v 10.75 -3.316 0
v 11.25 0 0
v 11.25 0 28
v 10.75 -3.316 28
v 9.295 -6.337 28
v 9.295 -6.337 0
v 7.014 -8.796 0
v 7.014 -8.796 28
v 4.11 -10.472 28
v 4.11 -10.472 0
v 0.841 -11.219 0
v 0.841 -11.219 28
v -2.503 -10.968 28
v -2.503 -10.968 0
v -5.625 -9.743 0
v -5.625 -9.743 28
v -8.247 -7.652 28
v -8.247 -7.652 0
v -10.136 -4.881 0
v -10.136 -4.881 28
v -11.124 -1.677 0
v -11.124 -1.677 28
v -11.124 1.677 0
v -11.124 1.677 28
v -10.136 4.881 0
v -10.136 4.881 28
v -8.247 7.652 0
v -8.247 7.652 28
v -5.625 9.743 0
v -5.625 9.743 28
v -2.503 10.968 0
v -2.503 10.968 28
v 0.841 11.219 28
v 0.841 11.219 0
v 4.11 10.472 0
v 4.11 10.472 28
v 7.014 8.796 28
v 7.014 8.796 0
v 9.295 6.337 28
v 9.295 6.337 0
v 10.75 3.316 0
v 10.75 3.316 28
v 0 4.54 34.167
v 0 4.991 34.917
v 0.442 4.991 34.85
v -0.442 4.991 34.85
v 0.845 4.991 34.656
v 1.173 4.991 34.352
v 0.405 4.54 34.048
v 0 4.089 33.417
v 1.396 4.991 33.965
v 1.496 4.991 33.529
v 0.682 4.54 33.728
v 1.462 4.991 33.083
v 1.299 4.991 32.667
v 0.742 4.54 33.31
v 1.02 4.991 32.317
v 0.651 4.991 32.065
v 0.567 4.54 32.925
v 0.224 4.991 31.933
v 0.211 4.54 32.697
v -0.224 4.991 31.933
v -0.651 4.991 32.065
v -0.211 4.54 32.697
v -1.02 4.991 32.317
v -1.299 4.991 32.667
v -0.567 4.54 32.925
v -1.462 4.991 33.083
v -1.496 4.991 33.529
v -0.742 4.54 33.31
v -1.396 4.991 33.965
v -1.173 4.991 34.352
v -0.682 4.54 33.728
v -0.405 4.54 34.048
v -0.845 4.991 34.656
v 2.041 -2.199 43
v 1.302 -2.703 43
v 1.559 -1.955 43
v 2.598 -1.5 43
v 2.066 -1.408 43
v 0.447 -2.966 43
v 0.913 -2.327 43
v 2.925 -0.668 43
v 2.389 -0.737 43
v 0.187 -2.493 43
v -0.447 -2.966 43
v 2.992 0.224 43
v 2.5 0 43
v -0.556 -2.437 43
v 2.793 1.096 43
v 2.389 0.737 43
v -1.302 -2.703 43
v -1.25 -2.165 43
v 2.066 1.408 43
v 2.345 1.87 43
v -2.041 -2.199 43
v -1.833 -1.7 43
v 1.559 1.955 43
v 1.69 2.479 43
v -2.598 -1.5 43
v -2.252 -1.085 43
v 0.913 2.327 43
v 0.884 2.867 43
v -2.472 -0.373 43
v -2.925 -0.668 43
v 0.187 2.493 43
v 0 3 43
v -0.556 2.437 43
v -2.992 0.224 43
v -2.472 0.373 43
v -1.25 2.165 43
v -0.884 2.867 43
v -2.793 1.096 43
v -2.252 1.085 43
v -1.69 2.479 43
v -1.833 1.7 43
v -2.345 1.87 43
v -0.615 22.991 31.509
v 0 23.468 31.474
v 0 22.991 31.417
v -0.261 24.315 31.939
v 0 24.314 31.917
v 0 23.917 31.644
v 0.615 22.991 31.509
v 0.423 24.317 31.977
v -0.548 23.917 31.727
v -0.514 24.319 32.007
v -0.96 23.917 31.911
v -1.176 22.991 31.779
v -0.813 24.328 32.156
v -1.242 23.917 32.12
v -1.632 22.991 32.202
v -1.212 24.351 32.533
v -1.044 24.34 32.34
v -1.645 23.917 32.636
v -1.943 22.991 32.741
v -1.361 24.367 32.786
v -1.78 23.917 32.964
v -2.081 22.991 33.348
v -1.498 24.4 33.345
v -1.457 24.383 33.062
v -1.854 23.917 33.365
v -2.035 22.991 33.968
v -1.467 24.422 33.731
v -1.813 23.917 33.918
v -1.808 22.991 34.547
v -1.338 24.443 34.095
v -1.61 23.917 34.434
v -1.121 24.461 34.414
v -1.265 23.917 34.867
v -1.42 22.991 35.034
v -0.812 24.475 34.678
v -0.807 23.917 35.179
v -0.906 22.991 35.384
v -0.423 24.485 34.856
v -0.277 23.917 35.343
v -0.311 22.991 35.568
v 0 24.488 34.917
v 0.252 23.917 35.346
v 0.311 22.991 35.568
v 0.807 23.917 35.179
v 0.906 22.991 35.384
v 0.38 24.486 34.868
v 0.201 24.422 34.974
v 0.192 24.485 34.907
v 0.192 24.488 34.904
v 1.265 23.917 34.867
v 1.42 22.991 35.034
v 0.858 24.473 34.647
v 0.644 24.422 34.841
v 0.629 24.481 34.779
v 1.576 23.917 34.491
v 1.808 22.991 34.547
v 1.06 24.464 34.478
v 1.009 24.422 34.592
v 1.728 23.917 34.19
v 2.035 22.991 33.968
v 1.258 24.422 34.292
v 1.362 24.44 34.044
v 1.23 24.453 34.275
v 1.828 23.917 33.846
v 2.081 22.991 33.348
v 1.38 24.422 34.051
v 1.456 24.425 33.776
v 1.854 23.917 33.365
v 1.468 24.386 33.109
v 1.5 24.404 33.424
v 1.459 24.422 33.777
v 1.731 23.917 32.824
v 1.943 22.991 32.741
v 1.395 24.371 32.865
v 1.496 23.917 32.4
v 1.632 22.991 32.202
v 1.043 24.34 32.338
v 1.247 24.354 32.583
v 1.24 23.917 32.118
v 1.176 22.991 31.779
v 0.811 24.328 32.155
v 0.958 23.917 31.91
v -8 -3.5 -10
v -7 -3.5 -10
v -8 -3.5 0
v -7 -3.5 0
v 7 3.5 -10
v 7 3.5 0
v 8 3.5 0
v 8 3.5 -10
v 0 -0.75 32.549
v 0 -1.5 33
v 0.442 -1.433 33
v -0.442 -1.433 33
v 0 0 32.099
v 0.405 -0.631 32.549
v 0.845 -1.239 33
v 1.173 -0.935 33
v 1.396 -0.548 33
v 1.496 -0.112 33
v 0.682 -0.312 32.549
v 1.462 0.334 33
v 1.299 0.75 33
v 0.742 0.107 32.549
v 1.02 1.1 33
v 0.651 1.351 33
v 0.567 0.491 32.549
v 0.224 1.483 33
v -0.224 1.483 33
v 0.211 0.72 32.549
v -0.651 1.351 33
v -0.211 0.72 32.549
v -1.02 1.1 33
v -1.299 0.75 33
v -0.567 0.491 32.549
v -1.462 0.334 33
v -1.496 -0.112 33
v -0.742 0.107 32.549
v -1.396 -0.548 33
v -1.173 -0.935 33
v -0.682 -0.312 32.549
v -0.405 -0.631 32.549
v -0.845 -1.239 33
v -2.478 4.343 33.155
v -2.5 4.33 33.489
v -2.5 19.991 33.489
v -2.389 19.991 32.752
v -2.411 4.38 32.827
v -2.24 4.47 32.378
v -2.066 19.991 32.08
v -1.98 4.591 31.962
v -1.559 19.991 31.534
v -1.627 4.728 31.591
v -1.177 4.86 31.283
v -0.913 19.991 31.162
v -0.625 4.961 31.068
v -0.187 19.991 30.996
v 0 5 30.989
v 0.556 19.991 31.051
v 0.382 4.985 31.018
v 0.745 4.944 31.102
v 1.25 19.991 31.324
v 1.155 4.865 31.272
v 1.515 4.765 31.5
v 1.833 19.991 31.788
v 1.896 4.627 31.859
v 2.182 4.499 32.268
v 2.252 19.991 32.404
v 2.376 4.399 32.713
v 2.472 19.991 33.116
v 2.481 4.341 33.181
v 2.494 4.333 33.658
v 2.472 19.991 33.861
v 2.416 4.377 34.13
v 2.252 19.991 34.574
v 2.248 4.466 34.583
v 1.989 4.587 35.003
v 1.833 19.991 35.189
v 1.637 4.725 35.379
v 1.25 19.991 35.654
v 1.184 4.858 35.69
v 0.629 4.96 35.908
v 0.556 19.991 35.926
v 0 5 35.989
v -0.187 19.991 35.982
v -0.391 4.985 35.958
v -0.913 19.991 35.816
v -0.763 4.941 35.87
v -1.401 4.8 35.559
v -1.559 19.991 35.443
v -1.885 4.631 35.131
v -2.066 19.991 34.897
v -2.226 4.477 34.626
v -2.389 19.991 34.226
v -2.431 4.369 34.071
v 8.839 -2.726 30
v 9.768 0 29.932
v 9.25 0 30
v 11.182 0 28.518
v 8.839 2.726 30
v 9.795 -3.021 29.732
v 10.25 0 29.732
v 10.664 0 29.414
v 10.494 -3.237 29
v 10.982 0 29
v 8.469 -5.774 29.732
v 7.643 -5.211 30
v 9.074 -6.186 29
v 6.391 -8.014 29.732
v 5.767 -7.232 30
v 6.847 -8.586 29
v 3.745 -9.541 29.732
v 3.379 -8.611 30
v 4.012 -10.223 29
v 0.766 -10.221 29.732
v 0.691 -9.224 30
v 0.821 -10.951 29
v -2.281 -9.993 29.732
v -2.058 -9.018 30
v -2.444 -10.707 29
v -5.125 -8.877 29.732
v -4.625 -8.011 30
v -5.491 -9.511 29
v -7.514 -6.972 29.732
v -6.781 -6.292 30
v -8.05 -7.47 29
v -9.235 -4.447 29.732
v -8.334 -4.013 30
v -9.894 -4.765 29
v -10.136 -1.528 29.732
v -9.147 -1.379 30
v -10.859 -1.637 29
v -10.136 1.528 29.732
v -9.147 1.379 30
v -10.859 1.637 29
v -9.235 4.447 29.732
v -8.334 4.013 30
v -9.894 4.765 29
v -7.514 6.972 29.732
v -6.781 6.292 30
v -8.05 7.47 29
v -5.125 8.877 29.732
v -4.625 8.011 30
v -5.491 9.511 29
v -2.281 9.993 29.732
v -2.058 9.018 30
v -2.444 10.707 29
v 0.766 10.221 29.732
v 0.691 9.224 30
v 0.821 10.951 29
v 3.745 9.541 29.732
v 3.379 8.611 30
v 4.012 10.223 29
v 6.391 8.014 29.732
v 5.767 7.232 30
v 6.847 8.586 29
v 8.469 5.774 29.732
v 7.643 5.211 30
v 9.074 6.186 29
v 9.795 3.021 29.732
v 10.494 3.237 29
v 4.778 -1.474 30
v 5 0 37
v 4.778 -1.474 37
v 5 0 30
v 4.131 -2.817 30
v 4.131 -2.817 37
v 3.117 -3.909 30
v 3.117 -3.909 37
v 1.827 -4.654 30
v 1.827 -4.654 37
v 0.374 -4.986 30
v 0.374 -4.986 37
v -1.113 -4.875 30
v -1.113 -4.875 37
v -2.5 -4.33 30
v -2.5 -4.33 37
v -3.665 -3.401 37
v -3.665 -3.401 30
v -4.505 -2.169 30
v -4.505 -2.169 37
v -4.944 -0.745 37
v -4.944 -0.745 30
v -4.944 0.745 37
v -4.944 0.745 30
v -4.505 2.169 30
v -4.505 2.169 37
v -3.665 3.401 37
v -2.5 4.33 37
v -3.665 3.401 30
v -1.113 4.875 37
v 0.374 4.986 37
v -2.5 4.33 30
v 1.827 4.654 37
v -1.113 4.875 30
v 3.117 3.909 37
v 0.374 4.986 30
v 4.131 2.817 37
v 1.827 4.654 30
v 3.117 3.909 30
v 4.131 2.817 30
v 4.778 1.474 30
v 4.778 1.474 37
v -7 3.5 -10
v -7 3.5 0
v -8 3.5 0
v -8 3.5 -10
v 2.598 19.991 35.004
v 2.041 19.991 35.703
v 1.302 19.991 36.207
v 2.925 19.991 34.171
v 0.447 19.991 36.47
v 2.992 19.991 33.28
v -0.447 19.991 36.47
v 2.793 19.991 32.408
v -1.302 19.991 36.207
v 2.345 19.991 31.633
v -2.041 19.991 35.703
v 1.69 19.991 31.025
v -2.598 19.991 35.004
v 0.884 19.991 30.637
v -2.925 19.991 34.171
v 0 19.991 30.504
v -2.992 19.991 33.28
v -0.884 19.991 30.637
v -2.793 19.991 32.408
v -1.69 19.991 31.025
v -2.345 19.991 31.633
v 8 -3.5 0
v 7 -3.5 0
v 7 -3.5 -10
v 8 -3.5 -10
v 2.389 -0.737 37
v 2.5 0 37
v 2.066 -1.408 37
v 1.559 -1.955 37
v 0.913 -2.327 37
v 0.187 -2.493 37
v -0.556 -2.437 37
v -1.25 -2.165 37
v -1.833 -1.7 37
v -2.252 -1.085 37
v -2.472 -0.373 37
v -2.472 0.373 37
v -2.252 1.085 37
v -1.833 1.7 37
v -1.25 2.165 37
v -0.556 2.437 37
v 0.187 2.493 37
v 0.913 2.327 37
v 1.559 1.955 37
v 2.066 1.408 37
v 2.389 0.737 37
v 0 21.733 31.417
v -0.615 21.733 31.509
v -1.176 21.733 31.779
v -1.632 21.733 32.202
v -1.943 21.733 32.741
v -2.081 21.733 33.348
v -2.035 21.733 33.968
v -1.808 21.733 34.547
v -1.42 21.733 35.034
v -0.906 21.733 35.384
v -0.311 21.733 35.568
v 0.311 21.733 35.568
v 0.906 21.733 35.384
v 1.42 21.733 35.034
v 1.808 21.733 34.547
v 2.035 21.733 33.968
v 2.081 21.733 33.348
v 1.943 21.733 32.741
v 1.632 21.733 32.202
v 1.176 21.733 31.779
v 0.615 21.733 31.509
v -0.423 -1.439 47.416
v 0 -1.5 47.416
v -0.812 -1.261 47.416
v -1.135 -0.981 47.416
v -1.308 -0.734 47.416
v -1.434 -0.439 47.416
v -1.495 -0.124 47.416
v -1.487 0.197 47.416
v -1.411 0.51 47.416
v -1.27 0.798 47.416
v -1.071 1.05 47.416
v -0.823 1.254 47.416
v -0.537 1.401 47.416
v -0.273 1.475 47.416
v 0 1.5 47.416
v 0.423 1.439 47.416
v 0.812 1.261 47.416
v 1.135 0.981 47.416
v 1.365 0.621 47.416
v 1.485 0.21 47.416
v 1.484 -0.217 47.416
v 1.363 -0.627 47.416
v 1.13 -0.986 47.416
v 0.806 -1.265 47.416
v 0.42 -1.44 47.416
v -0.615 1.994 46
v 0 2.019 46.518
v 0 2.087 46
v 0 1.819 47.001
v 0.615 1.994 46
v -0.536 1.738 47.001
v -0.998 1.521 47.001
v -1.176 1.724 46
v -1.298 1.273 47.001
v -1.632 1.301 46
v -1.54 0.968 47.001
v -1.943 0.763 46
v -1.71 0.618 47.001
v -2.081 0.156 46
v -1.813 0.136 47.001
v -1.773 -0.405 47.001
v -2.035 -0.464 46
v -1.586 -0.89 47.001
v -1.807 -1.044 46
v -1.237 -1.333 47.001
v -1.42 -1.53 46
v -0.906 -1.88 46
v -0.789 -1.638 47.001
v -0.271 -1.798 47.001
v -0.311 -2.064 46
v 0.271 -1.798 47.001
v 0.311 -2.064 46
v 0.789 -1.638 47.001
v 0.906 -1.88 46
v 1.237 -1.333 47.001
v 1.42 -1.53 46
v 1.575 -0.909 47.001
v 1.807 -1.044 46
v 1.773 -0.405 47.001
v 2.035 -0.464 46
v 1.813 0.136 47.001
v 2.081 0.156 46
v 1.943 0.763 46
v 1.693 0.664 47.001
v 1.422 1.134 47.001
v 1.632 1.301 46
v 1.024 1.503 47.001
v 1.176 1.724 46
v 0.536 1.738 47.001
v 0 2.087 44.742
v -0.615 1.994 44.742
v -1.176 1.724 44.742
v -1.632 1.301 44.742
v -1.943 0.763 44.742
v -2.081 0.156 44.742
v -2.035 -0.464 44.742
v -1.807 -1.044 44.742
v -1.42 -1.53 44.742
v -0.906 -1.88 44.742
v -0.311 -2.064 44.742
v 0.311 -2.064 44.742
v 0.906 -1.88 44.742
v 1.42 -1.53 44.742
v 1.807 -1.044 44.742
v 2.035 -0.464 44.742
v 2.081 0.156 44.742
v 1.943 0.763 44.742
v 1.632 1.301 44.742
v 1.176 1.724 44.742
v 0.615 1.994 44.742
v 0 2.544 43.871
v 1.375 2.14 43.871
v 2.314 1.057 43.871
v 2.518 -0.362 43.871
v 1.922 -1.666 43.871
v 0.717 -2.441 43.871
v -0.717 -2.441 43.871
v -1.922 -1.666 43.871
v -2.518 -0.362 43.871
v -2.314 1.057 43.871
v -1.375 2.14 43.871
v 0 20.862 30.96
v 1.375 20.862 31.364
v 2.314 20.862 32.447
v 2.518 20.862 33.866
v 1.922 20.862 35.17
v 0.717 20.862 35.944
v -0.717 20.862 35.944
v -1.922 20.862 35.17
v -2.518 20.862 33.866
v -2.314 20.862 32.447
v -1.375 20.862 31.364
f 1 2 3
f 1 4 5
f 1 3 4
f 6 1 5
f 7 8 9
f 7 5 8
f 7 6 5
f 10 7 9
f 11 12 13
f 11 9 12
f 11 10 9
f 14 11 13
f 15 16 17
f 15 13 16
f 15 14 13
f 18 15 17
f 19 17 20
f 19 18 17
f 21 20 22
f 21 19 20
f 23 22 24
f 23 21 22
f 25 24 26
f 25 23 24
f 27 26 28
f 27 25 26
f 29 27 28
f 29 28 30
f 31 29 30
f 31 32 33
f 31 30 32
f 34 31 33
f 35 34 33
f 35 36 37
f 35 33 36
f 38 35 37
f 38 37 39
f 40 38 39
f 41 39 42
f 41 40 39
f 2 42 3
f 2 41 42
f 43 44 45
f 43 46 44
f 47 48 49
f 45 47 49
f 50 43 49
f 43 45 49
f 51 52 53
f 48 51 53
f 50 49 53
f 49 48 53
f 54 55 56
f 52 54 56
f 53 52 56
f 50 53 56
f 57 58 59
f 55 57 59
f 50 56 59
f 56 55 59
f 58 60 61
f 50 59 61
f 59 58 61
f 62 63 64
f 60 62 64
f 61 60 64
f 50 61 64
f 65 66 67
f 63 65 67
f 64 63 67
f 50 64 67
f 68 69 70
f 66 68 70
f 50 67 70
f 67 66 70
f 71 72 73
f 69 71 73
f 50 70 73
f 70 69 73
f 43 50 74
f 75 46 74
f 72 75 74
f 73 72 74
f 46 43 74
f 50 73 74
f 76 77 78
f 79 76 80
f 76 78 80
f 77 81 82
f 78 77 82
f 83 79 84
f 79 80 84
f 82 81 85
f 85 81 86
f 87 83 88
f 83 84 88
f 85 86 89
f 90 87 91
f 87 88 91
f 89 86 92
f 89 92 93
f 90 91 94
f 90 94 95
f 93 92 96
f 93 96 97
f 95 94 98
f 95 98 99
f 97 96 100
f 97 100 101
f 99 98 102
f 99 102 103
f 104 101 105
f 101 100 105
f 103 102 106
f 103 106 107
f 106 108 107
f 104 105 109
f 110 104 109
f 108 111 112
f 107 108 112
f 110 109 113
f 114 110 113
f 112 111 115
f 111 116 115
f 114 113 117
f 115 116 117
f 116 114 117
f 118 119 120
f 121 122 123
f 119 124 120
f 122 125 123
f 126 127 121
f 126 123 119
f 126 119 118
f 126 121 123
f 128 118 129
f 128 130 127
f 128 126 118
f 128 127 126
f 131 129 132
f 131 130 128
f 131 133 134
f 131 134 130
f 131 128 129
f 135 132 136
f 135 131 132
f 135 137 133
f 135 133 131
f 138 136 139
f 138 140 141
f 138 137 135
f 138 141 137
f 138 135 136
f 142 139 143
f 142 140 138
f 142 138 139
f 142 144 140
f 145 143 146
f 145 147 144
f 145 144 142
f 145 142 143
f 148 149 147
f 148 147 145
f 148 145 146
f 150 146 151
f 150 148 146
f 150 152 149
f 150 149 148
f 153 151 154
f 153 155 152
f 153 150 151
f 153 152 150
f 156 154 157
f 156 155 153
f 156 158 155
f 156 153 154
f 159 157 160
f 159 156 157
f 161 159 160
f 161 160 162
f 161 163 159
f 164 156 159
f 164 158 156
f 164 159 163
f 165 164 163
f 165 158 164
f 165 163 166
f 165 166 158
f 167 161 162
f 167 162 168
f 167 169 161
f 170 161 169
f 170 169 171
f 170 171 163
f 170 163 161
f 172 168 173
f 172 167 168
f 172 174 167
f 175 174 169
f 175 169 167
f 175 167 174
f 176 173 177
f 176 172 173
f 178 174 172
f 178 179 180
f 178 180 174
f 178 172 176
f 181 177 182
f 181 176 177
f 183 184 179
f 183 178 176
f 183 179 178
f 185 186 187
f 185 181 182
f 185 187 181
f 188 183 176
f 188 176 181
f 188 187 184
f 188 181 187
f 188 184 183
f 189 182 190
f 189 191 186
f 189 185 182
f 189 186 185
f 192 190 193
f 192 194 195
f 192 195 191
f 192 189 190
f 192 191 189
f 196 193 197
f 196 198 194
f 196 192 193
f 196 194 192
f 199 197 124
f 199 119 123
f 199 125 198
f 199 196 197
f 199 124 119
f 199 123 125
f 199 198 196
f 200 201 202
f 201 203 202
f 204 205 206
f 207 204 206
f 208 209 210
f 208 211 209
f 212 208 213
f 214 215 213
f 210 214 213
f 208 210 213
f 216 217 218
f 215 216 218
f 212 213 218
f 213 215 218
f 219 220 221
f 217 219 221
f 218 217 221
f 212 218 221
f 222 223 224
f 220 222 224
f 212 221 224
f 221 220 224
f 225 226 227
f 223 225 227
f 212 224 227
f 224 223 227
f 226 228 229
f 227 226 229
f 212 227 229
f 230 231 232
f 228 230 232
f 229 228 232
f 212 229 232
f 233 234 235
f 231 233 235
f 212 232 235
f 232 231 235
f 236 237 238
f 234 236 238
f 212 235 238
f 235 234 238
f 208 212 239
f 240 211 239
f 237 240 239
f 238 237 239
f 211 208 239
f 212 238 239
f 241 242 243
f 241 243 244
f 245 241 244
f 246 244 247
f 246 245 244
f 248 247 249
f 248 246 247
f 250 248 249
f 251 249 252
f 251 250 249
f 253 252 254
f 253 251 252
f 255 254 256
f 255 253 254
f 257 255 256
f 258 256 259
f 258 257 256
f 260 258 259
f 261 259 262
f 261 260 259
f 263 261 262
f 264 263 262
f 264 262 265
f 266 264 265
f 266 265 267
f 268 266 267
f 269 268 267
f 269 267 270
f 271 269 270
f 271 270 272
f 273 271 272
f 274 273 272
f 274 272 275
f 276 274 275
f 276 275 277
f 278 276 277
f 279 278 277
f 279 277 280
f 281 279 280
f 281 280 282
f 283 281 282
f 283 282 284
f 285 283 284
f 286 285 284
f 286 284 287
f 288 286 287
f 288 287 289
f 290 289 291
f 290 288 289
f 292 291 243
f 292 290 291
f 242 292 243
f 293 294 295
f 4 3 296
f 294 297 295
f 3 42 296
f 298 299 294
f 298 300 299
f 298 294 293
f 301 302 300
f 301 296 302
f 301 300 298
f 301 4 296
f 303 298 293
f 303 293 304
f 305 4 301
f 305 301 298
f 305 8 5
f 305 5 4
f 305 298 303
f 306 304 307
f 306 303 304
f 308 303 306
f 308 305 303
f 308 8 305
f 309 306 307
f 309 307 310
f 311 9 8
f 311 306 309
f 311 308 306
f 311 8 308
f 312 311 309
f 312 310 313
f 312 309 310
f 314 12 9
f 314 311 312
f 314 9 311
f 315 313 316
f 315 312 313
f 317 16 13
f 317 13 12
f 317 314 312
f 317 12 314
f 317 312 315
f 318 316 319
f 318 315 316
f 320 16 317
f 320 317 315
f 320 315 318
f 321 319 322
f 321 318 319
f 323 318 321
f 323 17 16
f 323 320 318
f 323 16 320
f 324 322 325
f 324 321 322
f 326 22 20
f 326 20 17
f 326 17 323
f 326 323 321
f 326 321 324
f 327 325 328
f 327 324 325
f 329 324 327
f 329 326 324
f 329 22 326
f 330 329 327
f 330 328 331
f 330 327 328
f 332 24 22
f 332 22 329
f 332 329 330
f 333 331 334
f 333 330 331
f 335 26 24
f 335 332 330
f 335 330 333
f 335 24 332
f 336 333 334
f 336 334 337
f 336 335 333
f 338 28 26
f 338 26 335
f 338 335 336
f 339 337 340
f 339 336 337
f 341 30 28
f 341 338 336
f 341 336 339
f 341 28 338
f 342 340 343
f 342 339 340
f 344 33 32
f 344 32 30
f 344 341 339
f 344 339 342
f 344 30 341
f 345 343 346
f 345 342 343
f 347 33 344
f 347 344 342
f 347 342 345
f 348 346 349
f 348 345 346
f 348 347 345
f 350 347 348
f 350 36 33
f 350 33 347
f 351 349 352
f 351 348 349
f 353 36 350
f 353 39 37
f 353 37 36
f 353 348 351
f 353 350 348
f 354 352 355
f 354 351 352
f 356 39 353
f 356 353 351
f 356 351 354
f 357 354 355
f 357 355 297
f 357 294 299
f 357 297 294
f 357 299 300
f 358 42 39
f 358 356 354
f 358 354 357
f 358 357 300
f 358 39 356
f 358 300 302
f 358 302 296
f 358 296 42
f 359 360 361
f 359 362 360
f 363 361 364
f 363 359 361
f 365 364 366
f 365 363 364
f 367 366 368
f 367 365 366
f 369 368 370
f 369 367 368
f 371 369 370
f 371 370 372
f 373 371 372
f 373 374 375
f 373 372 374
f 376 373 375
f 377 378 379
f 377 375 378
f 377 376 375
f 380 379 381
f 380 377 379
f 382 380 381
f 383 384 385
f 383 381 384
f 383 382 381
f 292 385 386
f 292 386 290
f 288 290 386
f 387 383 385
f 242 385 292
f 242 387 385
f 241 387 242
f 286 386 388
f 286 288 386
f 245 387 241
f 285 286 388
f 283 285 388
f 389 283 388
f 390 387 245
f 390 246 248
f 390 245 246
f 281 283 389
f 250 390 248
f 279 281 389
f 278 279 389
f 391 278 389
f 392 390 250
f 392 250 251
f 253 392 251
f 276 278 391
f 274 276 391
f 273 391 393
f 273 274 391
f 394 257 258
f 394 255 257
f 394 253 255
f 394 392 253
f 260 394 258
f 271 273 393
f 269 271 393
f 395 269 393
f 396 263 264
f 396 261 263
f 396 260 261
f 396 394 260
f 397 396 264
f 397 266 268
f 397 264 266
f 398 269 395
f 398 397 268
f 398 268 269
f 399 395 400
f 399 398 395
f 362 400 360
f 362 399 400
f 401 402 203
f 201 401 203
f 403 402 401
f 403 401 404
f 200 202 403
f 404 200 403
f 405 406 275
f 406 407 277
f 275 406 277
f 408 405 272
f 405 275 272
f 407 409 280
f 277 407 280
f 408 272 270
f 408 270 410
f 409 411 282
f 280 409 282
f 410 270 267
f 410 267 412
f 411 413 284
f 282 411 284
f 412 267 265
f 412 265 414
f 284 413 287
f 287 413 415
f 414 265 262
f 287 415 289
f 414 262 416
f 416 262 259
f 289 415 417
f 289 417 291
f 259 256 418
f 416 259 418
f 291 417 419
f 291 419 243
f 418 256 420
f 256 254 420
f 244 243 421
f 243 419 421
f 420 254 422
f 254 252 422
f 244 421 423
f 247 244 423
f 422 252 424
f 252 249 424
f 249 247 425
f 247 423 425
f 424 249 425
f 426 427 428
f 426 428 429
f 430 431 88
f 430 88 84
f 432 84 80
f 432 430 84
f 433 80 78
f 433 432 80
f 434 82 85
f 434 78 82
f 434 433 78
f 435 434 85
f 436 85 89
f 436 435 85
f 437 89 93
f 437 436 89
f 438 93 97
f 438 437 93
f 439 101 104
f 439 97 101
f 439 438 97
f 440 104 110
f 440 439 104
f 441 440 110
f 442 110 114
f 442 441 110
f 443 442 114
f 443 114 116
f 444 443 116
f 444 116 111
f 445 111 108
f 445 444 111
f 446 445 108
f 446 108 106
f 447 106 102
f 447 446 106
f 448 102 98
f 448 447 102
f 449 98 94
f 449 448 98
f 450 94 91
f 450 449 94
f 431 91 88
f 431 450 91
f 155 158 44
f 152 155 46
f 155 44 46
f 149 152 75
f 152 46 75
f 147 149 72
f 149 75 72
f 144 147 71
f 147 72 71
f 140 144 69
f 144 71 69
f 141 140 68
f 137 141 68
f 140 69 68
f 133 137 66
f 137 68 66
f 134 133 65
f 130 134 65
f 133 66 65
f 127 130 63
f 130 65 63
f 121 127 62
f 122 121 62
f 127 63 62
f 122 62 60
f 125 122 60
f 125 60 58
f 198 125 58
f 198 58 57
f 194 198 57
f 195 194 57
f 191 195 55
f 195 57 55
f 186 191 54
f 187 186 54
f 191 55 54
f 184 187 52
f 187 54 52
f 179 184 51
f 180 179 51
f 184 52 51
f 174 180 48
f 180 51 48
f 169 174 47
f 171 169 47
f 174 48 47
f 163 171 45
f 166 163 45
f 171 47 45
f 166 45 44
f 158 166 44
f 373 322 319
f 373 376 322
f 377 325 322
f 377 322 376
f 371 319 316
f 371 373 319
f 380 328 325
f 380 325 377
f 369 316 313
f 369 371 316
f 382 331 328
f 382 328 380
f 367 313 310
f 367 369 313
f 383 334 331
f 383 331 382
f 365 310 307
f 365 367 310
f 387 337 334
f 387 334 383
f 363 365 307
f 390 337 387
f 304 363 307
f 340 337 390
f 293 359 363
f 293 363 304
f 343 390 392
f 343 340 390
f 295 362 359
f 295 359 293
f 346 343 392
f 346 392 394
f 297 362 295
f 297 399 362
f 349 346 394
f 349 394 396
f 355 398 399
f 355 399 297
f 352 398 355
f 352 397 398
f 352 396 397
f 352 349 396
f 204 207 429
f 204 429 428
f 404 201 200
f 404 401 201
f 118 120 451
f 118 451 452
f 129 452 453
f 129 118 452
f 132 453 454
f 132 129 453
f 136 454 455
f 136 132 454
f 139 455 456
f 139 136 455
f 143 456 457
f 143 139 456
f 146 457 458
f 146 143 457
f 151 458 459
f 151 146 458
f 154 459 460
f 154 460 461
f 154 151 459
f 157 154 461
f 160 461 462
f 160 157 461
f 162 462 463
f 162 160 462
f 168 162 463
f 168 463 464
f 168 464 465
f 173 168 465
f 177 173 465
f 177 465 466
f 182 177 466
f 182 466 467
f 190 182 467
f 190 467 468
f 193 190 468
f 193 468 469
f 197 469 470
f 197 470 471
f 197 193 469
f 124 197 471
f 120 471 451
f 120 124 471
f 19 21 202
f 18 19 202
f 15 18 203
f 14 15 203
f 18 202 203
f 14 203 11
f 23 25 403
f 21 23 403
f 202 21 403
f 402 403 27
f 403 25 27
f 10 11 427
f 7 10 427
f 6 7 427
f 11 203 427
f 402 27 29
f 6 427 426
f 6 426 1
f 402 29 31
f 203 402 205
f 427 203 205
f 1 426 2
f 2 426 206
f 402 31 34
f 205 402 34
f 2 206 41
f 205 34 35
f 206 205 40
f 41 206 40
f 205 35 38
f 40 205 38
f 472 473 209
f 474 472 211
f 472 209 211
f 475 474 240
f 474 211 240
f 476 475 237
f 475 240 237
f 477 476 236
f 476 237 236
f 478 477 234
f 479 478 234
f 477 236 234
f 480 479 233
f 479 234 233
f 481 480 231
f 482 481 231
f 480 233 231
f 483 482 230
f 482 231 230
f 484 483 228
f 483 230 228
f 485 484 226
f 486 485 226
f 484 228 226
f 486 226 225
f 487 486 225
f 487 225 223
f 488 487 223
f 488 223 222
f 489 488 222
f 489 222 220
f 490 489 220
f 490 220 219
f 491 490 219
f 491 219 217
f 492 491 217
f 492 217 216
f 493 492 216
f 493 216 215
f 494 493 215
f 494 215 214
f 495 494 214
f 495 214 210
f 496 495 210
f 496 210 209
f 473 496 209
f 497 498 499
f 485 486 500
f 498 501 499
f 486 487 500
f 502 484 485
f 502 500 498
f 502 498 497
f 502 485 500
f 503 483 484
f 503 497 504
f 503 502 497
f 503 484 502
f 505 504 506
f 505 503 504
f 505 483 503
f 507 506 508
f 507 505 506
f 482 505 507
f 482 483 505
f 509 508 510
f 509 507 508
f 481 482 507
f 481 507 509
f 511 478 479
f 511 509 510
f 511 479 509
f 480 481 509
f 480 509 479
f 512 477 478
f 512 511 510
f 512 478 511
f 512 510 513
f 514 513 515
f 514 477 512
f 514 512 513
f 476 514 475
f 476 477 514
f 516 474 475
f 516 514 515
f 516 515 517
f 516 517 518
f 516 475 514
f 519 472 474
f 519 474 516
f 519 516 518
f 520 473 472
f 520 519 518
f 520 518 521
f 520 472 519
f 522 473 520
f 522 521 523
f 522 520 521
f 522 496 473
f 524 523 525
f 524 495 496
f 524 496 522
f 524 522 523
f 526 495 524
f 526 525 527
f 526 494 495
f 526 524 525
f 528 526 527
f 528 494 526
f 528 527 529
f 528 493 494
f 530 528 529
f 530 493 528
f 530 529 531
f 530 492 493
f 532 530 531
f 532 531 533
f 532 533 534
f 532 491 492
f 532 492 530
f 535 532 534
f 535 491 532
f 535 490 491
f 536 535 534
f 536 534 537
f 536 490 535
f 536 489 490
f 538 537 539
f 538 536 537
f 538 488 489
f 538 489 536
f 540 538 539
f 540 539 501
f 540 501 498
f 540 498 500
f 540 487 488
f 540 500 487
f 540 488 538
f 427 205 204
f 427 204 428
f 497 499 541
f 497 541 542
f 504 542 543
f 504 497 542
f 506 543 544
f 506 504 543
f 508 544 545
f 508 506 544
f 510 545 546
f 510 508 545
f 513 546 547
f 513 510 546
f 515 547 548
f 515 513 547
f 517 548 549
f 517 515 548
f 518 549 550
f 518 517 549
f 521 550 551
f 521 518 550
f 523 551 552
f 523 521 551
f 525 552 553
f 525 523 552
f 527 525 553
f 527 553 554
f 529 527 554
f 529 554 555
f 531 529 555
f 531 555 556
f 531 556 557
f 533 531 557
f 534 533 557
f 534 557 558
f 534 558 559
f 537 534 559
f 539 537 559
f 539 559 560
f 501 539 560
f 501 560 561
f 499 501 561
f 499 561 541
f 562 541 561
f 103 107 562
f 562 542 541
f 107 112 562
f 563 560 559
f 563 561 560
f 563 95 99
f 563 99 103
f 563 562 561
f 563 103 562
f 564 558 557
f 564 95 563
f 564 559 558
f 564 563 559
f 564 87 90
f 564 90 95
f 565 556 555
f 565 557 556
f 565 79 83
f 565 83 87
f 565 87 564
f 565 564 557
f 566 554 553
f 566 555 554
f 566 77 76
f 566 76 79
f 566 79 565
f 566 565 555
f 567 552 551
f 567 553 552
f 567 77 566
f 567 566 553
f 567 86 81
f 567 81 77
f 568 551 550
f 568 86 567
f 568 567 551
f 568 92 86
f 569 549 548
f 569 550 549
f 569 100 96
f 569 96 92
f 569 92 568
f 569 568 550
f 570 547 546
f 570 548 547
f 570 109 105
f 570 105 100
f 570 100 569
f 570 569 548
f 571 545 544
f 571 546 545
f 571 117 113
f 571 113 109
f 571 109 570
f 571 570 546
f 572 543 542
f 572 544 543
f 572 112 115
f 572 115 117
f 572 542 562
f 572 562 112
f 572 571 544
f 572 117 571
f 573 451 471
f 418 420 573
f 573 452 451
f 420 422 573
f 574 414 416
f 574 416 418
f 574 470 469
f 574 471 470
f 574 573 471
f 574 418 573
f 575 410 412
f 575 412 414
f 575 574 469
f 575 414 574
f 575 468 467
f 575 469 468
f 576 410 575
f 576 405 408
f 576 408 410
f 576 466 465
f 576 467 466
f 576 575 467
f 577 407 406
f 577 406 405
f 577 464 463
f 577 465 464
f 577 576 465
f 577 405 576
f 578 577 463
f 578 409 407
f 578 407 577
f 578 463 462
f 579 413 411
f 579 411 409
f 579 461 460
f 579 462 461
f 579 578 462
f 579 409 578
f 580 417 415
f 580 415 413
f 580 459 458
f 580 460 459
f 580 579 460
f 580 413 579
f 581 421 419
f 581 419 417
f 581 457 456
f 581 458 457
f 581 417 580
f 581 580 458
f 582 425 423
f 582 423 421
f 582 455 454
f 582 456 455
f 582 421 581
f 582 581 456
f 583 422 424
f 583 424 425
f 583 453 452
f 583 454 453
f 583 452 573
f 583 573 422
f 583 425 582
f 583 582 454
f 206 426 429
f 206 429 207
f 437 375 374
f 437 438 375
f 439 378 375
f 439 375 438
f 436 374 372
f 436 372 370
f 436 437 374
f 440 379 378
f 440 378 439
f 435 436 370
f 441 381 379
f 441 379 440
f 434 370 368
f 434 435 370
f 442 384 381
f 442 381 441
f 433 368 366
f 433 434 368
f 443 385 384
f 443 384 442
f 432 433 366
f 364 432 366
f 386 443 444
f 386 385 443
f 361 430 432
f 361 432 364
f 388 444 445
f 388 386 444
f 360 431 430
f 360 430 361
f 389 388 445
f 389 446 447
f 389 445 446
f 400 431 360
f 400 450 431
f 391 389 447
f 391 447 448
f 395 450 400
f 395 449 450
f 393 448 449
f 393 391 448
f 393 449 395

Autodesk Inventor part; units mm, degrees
ref_plane "XY Plane" through (0, 0, 0) normal (0, 0, 1) x (1, 0, 0)
sketch "Block1" plane through (0, 0, 0) normal (0, 0, 1) x (1, 0, 0)
  line L0 (-0.685, 86) -> (2.315, 86)
  line L1 (-0.685, 86) -> (-0.685, 91)
  line L2 (2.315, 86) -> (1.4022, 87.742)
  line L3 (1.4022, 87.742) -> (1.4022, 89)
  line L4 (-0.5978, 91) -> (-0.685, 91)
  arc A0 (1.4022, 89) -> (-0.5978, 91) centre (-0.5978, 89) ccw
  point P0 (0.6511, 88.4856)
  dimension "d9" = 3
  dimension "d10" = 5
  dimension "d11" = 2
  dimension "d14" = 152.344
  dimension "d15" = 2.0871
sketch "Skizze1" plane through (0, 0, 0) normal (0, 0, 1) x (1, 0, 0)
  point P0 (0, 0)
sketch "Skizze2" plane through (0, 0, 0) normal (0, 0, 1) x (1, 0, 0)
  circle A0 centre (0, 0) radius 11.25
  dimension "d0" = 22.5
extrude "Extrusion1" add sketch "Skizze2" along normal blind 30
sketch "Skizze3" plane through (0, 0, 30) normal (0, 0, 1) x (1, 0, 0)
  circle A0 centre (0, 0) radius 11.25 projected
  circle A1 centre (0, 0) radius 5
  dimension "d3" = 10
extrude "Extrusion2" add sketch "Skizze3" along normal blind 7 contours A1
sketch "Skizze4" plane through (0, 0, 37) normal (0, 0, 1) x (1, 0, 0)
  circle A0 centre (0, 0) radius 5 projected
  circle A1 centre (0, 0) radius 2.5
  dimension "d6" = 5
extrude "Extrusion3" add sketch "Skizze4" along normal blind 6 contours A1
sketch "Skizze5" plane through (0, 0, 0) normal (1, 0, 0) x (0, 1, 0)
  line L0 (2.5, 43) -> (-2.5, 43) projected
  line L1 (-2.5, 43) -> (2.5, 43) construction
  line L2 (0, 43) -> (3, 43)
  line L3 (0, 43) -> (0, 48)
  line L4 (3, 43) -> (2.0871, 44.742)
  line L5 (2.0871, 44.742) -> (2.0871, 46)
  line L6 (0.0871, 48) -> (0, 48)
  arc A0 (2.0871, 46) -> (0.0871, 48) centre (0.0871, 46) ccw
  point P0 (0, 0)
sketch "Skizze6" plane through (0, 0, 0) normal (0, 0, -1) x (-1, 0, 0)
  line L0 (7, 3.5) -> (7, -3.5)
  line L1 (7, -3.5) -> (8, -3.5)
  line L2 (7, 3.5) -> (8, 3.5)
  line L3 (8, -3.5) -> (8, 3.5)
  line L4 (0, 11.25) -> (0, -11.25) construction
  line L5 (-7, 3.5) -> (-7, -3.5)
  line L6 (-7, -3.5) -> (-8, -3.5)
  line L7 (-7, 3.5) -> (-8, 3.5)
  line L8 (-8, -3.5) -> (-8, 3.5)
  point P0 (0, 0)
  dimension "d19" = 7
  dimension "d20" = 1
  dimension "d21" = 7
  dimension "d23" = 3.5
extrude "Extrusion4" add sketch "Skizze6" along normal blind 10
revolve "Umdrehung2" add sketch "Skizze5" angle 360 about axis through (0, 0, 43) along (0, 0, 1)
ref_plane "Arbeitsebene2" through (0, 5, 30) normal (0, 1, 0) x (-1, 0, 0)
ref_plane "Arbeitsebene1" through (0, 5, 30) normal (0, 1, 0) x (-1, 0, 0)
sketch "Skizze7" plane through (0, 5, 30) normal (0, 1, 0) x (-1, 0, 0)
  circle A0 centre (0, 3.4888) radius 2.5
  point P0 (0, -30)
  dimension "d27" = 5
extrude "Extrusion5" add sketch "Skizze7" along normal blind 15 and the other way blind 3
sketch "Skizze9" plane through (0, 0, 0) normal (1, 0, 0) x (0, 1, 0)
  point P0 (0, 0)
sketch "Skizze10" plane through (0, 0, 0) normal (1, 0, 0) x (0, 1, 0)
  point P0 (0, 0)
ref_plane "Arbeitsebene6" through (0, 0, 0) normal (1, 0, 0) x (0, 1, 0)
ref_plane "Arbeitsebene7" through (0, 20, 33.4888) normal (0, 1, 0) x (1, 0, 0)
sketch "Skizze11" plane through (0, 0, 0) normal (1, 0, 0) x (0, 1, 0)
  point P0 (0, 0)
sketch "Skizze12" plane through (0, 0, 0) normal (1, 0, 0) x (0, 1, 0)
  line L0 (0, 0) -> (0, 41.8024) construction
sketch "Skizze13" plane through (0, 0, 0) normal (1, 0, 0) x (0, 1, 0)
  line L0 (0, 43) -> (3, 43)
  line L1 (0, 43) -> (0, 48)
  line L2 (3, 43) -> (2.0871, 44.742)
  line L3 (2.0871, 44.742) -> (2.0871, 46)
  line L4 (0.0871, 48) -> (0, 48)
  arc A0 (2.0871, 46) -> (0.0871, 48) centre (0.0871, 46) ccw
  line L5 (19.9907, 33.5038) -> (19.9907, 30.5038)
  line L6 (19.9907, 33.5038) -> (24.9907, 33.5038)
  line L7 (19.9907, 30.5038) -> (21.7326, 31.4166)
  line L8 (21.7326, 31.4166) -> (22.9907, 31.4166)
  line L9 (24.9907, 33.4166) -> (24.9907, 33.5038)
  arc A1 (22.9907, 31.4166) -> (24.9907, 33.4166) centre (22.9907, 33.4166) ccw
  point P0 (0, 0)
revolve "Umdrehung3" add sketch "Skizze13" angle 360 about axis through (0, 19.9907, 33.5038) along (0, 1, 0) contours L6 L9 A1 L8 L7 L5
fillet "Rundung1" radius 2 1 edges at (-11.25, 0, 30)
ref_plane "Arbeitsebene8" through (0, 0.0871, 48) normal (0, 0, 1) x (1, 0, 0)
sketch "Skizze14" plane through (0, 0.0871, 48) normal (0, 0, 1) x (1, 0, 0)
  point P0 (0, -0.0871)
  point P1 (0, -0.0871)
hole "Bohrung1" at (0, 0, 48) direction (0, 0, -1) diameter 3 depth 15 tip angle 118
ref_plane "Arbeitsebene9" through (0, 24.9907, 33.4166) normal (0, 1, 0) x (-1, 0, 0)
sketch "Skizze15" plane through (0, 24.9907, 33.4166) normal (0, 1, 0) x (-1, 0, 0)
  point P0 (0, -33.4166)
  point P1 (0, 0)
hole "Bohrung2" at (0, 24.9907, 33.4166) direction (0, -1, 0) diameter 3 depth 20 tip angle 118
properties part number "Ventil"
